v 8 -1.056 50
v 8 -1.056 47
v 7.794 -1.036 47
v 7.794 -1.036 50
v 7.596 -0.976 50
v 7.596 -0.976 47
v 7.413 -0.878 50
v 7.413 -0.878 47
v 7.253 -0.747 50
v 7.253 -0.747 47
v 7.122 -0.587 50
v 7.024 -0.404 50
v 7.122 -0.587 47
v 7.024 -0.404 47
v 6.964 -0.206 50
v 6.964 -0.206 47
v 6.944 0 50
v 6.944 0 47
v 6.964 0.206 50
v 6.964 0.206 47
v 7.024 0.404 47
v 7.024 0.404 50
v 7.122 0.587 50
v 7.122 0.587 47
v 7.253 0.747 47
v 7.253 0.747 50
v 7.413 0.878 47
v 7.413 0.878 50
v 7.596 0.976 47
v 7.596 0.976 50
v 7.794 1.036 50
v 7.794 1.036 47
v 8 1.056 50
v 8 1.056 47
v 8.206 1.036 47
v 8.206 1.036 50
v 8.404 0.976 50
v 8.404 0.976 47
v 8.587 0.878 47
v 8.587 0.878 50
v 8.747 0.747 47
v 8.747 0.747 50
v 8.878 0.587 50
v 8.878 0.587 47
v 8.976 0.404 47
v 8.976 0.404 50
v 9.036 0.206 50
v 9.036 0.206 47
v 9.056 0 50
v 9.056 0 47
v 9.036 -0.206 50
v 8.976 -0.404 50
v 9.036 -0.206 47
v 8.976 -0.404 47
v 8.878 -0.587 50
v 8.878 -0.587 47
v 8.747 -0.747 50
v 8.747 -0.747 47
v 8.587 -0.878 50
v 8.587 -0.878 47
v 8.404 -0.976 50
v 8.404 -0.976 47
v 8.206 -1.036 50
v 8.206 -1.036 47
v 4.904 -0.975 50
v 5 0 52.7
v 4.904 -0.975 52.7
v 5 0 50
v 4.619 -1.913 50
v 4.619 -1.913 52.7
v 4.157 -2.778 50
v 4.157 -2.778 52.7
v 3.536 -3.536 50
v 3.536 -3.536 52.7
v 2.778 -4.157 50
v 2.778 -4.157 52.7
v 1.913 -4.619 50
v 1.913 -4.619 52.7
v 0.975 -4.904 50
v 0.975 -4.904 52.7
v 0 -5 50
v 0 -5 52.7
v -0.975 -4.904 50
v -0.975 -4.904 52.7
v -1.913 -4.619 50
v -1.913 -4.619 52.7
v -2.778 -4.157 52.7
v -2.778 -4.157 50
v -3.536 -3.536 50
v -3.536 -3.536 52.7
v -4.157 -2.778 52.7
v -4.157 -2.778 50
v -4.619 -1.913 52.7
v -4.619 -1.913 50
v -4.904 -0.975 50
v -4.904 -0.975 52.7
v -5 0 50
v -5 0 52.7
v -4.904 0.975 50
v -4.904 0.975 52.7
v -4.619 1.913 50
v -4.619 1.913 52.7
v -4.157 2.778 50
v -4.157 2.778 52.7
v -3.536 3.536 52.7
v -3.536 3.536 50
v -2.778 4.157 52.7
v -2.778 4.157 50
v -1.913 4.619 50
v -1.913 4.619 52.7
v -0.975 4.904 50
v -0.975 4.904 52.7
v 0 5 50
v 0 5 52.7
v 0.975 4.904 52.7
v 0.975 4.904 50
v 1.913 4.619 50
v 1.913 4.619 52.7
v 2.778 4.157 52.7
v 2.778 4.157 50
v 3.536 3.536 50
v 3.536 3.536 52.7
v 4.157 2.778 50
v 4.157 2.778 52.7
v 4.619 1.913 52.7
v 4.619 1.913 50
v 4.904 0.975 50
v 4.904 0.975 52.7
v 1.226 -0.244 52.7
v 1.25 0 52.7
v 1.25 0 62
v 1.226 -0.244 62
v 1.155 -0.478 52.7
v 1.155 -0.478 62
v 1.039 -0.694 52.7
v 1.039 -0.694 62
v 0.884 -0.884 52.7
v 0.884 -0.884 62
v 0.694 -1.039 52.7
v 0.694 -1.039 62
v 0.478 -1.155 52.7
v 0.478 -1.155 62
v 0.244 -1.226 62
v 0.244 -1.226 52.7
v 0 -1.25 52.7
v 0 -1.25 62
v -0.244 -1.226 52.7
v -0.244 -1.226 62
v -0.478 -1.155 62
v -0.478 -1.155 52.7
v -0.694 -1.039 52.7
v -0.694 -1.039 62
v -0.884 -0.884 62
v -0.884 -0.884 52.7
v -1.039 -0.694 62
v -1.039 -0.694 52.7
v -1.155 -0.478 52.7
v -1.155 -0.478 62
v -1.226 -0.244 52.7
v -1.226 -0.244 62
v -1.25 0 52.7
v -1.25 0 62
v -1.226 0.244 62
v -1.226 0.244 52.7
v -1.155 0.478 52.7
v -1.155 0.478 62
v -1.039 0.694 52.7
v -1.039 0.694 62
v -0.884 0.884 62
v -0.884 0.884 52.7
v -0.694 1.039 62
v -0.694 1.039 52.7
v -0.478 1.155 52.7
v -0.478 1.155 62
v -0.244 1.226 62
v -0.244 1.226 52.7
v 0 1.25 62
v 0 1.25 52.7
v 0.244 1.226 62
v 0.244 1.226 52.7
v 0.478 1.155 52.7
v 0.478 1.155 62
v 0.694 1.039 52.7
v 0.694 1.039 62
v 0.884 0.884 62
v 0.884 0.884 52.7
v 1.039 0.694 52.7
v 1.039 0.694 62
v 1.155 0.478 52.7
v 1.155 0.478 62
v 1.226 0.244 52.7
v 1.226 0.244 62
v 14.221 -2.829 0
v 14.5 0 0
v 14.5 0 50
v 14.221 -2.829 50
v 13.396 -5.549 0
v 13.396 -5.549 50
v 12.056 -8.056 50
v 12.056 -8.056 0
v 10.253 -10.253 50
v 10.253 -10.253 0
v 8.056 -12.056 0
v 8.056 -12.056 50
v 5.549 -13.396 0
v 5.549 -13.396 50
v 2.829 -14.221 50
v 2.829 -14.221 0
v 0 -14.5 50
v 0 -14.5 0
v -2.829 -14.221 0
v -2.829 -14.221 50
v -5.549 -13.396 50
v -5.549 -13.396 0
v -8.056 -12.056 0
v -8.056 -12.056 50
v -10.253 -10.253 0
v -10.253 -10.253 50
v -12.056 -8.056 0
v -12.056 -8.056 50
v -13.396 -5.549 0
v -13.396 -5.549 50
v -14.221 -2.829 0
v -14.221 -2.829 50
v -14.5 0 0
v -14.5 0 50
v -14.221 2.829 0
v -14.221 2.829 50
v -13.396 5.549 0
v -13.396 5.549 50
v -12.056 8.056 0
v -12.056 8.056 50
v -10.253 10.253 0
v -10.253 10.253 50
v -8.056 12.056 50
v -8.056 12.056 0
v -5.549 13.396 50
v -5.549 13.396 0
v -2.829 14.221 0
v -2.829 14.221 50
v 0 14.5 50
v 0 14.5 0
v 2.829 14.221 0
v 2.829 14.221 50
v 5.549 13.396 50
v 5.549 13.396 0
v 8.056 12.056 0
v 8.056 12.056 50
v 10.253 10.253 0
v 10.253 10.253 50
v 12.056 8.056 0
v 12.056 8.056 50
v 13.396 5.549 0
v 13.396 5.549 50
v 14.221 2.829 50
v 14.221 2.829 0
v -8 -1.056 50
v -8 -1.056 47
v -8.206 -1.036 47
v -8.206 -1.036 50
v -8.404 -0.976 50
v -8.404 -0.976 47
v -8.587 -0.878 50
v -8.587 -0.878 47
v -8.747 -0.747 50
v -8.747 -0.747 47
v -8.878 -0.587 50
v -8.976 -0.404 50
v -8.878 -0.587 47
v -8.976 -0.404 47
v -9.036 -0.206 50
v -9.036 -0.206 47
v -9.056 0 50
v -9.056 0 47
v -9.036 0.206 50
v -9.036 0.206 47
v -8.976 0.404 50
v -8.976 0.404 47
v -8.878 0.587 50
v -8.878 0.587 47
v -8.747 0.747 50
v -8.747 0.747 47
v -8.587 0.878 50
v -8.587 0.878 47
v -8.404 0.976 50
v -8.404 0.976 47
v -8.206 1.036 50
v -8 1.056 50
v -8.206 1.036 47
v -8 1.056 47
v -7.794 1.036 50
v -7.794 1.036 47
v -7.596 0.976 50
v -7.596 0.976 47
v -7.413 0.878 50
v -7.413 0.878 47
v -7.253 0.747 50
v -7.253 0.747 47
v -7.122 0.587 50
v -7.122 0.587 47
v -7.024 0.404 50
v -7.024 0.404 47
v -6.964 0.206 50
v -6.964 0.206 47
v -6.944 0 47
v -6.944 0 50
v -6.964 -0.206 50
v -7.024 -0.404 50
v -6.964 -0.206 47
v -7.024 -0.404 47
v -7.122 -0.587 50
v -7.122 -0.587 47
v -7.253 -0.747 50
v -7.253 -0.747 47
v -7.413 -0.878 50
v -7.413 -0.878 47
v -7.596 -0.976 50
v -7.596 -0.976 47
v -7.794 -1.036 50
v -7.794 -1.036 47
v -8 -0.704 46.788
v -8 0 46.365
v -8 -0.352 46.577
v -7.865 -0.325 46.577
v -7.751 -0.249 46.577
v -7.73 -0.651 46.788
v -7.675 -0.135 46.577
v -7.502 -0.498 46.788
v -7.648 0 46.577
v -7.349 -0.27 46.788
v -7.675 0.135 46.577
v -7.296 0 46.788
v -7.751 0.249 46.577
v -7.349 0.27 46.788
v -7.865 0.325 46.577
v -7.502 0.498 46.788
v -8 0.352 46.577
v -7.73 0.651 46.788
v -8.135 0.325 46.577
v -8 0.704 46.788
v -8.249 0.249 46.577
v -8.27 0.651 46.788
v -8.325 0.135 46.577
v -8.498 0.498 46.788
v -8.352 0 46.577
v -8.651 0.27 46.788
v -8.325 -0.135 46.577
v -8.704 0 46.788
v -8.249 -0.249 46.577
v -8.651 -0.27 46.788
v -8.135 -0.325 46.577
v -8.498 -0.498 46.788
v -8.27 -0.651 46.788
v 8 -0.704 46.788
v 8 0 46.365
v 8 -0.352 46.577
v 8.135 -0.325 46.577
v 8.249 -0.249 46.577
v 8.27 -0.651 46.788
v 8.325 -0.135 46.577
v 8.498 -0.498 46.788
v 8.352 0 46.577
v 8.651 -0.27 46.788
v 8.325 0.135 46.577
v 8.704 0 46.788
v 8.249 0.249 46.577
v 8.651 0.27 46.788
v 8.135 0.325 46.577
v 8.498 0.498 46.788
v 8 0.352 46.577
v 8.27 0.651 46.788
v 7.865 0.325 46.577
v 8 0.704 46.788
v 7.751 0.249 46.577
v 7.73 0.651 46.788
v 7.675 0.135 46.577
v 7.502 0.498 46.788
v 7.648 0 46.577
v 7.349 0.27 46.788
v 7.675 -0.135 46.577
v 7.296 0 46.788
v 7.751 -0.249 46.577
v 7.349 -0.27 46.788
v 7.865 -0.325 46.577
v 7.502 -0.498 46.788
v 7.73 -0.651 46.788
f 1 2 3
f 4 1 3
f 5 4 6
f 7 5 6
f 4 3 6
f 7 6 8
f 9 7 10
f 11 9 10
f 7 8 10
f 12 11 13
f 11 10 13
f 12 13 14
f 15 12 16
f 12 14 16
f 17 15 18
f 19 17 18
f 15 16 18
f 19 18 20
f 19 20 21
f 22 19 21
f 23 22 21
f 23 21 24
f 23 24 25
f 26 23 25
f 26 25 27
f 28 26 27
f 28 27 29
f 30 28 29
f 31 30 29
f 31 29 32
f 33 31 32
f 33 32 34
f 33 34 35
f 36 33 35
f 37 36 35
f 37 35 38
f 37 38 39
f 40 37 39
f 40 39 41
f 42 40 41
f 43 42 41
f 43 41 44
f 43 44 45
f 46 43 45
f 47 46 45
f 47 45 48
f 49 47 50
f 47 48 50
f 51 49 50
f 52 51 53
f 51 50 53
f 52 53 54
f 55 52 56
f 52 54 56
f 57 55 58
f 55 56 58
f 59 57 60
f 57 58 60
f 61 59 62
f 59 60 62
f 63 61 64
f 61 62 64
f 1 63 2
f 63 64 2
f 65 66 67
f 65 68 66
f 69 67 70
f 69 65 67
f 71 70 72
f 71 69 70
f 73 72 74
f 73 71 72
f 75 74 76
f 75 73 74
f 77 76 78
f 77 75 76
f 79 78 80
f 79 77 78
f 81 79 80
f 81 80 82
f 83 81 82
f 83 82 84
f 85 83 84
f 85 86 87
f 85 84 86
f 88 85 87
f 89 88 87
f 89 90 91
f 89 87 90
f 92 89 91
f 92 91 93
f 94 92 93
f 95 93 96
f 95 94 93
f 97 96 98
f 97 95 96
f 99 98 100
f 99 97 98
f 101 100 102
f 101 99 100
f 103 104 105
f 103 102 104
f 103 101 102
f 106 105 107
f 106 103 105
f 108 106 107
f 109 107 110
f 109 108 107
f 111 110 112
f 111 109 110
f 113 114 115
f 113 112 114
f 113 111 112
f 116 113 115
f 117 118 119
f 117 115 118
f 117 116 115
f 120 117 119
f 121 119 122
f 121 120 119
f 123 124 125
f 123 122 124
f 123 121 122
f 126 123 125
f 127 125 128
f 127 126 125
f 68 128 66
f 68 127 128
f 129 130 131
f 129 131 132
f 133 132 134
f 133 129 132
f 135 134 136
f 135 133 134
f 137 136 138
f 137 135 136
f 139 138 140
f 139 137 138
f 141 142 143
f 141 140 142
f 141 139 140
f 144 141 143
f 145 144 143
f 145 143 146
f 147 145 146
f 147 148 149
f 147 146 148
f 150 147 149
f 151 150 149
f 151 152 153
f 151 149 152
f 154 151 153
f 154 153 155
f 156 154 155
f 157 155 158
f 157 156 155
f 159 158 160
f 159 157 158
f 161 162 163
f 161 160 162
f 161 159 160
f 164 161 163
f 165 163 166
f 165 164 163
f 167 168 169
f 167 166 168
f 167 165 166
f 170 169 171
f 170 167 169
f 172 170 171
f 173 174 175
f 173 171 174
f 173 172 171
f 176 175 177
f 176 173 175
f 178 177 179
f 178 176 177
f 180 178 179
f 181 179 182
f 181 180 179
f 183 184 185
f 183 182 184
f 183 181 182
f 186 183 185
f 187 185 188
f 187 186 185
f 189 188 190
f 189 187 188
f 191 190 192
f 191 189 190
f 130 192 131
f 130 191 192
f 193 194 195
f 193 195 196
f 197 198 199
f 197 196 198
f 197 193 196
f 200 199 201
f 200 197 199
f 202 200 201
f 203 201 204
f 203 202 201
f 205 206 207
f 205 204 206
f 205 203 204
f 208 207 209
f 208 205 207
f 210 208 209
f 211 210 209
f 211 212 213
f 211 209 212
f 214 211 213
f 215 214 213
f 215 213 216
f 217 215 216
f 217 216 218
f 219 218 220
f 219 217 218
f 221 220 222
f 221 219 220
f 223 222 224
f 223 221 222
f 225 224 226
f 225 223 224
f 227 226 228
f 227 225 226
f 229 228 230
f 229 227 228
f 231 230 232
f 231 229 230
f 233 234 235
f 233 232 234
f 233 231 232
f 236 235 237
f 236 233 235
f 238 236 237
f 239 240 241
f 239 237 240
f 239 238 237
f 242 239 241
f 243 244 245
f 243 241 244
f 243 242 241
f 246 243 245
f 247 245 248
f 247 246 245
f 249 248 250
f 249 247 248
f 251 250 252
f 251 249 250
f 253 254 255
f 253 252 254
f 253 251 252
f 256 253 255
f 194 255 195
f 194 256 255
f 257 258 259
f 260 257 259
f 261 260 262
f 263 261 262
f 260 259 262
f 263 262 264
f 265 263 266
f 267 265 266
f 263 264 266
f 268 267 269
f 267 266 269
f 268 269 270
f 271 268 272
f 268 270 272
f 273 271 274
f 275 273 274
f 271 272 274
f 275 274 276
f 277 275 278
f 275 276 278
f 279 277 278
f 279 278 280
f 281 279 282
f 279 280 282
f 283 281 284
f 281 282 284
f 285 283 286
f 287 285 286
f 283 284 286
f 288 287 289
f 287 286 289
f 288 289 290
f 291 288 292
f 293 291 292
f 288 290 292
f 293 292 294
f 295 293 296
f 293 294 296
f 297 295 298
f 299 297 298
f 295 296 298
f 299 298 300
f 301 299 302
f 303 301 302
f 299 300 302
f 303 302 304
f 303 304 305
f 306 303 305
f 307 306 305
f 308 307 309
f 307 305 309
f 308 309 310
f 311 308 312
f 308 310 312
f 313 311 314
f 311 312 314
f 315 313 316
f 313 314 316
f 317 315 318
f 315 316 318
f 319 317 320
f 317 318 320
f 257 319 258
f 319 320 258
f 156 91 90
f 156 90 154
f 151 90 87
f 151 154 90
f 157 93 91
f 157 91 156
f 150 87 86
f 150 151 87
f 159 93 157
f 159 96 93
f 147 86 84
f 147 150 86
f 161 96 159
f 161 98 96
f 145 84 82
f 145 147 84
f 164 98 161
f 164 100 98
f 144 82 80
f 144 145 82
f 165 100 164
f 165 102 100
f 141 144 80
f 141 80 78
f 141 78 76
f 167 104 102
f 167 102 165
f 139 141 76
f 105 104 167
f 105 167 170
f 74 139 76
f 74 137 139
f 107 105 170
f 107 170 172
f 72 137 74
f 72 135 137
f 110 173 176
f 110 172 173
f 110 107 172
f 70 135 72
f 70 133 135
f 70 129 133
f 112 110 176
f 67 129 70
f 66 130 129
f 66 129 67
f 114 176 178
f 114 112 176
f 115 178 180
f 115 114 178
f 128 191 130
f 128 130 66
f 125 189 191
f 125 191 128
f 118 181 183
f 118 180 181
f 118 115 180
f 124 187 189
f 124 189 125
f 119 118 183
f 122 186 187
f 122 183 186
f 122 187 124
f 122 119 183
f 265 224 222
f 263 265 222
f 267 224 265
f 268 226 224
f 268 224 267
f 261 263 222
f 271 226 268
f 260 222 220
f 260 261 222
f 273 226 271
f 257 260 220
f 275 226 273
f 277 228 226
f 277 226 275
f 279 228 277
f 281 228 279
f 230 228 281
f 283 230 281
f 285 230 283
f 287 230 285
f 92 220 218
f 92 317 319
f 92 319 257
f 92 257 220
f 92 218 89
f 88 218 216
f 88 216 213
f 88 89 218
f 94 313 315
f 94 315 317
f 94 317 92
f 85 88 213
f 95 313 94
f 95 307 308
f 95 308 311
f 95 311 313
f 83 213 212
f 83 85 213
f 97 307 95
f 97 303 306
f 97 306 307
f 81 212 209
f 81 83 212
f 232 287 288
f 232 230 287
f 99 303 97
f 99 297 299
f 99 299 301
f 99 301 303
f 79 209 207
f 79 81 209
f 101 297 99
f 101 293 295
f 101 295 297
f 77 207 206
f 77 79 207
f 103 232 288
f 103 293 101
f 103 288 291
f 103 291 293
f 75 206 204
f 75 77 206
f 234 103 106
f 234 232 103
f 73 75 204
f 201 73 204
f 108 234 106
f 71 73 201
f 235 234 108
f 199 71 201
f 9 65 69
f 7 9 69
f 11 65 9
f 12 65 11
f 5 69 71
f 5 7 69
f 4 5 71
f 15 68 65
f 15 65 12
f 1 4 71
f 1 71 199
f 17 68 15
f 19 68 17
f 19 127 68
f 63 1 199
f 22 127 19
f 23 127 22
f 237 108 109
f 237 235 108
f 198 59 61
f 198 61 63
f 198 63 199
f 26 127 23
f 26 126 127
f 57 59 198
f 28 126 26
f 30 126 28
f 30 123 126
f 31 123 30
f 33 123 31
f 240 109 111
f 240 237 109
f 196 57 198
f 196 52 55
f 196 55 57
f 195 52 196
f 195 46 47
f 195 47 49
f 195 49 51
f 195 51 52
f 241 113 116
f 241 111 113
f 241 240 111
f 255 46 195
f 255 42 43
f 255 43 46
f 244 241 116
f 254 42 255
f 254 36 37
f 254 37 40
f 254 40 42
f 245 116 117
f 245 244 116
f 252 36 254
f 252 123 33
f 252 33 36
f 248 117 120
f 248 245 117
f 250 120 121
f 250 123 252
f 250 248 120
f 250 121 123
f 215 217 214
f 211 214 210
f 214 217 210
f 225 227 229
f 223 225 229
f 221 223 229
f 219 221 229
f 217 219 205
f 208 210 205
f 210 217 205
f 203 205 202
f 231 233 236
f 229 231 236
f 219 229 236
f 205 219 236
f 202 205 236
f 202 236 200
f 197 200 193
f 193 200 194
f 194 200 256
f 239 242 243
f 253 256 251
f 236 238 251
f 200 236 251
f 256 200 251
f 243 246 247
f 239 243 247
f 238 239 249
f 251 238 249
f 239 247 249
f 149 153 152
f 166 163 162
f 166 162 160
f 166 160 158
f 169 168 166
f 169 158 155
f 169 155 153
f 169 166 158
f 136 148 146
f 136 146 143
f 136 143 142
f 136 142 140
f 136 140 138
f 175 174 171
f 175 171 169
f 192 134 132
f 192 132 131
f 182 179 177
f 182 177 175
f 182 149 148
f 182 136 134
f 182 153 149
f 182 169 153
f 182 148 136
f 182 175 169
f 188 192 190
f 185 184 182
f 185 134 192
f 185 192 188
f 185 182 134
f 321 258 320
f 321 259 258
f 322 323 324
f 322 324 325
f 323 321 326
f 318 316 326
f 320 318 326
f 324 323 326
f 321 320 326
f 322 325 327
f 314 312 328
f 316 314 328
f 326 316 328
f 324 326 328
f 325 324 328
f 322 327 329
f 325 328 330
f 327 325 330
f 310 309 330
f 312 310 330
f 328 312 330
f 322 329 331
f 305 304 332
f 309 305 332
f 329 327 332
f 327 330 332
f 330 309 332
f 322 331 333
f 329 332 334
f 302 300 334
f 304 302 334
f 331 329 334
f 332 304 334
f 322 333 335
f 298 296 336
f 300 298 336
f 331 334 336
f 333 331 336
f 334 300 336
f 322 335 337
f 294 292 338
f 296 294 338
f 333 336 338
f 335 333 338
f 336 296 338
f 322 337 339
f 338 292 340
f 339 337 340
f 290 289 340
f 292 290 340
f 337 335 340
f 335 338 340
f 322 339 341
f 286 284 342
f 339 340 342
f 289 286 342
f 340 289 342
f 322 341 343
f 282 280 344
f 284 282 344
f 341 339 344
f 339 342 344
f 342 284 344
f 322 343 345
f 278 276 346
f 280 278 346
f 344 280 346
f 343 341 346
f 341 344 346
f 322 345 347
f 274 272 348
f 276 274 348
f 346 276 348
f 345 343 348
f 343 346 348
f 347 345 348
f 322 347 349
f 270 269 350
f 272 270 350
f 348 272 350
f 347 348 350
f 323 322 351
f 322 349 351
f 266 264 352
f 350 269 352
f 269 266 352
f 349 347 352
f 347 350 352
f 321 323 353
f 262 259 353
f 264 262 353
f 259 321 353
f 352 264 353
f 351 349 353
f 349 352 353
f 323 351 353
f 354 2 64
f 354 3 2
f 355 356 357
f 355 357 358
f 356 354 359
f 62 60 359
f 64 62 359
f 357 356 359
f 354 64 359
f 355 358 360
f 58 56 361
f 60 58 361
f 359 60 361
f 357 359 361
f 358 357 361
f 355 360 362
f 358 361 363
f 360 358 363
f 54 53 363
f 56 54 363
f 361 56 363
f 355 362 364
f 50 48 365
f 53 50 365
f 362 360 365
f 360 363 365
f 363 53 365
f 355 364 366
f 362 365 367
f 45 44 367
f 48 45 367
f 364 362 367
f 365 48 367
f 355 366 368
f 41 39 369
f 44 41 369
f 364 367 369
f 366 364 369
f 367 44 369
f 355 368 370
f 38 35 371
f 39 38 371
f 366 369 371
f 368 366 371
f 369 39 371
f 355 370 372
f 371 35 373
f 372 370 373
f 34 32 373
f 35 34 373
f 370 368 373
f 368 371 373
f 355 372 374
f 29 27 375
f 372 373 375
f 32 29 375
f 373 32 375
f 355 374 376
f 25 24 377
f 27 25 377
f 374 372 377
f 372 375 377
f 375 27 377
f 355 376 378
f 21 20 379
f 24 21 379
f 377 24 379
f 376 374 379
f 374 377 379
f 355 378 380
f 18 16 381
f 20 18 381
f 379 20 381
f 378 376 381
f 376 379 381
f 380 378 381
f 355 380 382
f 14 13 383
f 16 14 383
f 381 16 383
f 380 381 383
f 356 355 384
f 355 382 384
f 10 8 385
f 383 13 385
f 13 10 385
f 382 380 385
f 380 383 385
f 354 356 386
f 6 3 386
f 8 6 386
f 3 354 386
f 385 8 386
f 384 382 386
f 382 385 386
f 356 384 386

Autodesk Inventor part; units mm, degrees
ref_plane "YZ Plane" through (0, 0, 0) normal (1, 0, 0) x (0, 1, 0)
ref_plane "XZ Plane" through (0, 0, 0) normal (0, 1, 0) x (-1, 0, 0)
ref_plane "XY Plane" through (0, 0, 0) normal (0, 0, 1) x (1, 0, 0)
sketch "スケッチ1" plane through (0, 0, 0) normal (0, 0, 1) x (1, 0, 0)
  circle A0 centre (0, 0) radius 14.5
  dimension "d0" = 29
extrude "押し出し1" add sketch "スケッチ1" along normal blind 50
sketch "スケッチ2" plane through (0, 0, 50) normal (0, 0, 1) x (1, 0, 0)
  circle A0 centre (0, 0) radius 5
  dimension "d3" = 10
extrude "押し出し2" add sketch "スケッチ2" along normal blind 2.7
sketch "スケッチ3" plane through (0, 0, 52.7) normal (0, 0, 1) x (1, 0, 0)
  circle A0 centre (0, 0) radius 1.25
  dimension "d6" = 2.5
extrude "押し出し3" add sketch "スケッチ3" along normal blind 9.3
sketch "スケッチ4" plane through (0, 0, 50) normal (0, 0, 1) x (1, 0, 0)
  circle A0 centre (0, 0) radius 14.5 projected
  line L0 (0, 14.5) -> (0, -14.5)
  point P0 (-8, 0)
  point P1 (8, 0)
  dimension "d9" = 16
hole "穴1" at (-8, 0, 50) at (8, 0, 50) direction (0, 0, -1) diameter 2.1129 depth 3 tip angle 118 thread size "M2.6x0.45" class "6H" standard "ISO Metric profile"
properties part number "RD008"
